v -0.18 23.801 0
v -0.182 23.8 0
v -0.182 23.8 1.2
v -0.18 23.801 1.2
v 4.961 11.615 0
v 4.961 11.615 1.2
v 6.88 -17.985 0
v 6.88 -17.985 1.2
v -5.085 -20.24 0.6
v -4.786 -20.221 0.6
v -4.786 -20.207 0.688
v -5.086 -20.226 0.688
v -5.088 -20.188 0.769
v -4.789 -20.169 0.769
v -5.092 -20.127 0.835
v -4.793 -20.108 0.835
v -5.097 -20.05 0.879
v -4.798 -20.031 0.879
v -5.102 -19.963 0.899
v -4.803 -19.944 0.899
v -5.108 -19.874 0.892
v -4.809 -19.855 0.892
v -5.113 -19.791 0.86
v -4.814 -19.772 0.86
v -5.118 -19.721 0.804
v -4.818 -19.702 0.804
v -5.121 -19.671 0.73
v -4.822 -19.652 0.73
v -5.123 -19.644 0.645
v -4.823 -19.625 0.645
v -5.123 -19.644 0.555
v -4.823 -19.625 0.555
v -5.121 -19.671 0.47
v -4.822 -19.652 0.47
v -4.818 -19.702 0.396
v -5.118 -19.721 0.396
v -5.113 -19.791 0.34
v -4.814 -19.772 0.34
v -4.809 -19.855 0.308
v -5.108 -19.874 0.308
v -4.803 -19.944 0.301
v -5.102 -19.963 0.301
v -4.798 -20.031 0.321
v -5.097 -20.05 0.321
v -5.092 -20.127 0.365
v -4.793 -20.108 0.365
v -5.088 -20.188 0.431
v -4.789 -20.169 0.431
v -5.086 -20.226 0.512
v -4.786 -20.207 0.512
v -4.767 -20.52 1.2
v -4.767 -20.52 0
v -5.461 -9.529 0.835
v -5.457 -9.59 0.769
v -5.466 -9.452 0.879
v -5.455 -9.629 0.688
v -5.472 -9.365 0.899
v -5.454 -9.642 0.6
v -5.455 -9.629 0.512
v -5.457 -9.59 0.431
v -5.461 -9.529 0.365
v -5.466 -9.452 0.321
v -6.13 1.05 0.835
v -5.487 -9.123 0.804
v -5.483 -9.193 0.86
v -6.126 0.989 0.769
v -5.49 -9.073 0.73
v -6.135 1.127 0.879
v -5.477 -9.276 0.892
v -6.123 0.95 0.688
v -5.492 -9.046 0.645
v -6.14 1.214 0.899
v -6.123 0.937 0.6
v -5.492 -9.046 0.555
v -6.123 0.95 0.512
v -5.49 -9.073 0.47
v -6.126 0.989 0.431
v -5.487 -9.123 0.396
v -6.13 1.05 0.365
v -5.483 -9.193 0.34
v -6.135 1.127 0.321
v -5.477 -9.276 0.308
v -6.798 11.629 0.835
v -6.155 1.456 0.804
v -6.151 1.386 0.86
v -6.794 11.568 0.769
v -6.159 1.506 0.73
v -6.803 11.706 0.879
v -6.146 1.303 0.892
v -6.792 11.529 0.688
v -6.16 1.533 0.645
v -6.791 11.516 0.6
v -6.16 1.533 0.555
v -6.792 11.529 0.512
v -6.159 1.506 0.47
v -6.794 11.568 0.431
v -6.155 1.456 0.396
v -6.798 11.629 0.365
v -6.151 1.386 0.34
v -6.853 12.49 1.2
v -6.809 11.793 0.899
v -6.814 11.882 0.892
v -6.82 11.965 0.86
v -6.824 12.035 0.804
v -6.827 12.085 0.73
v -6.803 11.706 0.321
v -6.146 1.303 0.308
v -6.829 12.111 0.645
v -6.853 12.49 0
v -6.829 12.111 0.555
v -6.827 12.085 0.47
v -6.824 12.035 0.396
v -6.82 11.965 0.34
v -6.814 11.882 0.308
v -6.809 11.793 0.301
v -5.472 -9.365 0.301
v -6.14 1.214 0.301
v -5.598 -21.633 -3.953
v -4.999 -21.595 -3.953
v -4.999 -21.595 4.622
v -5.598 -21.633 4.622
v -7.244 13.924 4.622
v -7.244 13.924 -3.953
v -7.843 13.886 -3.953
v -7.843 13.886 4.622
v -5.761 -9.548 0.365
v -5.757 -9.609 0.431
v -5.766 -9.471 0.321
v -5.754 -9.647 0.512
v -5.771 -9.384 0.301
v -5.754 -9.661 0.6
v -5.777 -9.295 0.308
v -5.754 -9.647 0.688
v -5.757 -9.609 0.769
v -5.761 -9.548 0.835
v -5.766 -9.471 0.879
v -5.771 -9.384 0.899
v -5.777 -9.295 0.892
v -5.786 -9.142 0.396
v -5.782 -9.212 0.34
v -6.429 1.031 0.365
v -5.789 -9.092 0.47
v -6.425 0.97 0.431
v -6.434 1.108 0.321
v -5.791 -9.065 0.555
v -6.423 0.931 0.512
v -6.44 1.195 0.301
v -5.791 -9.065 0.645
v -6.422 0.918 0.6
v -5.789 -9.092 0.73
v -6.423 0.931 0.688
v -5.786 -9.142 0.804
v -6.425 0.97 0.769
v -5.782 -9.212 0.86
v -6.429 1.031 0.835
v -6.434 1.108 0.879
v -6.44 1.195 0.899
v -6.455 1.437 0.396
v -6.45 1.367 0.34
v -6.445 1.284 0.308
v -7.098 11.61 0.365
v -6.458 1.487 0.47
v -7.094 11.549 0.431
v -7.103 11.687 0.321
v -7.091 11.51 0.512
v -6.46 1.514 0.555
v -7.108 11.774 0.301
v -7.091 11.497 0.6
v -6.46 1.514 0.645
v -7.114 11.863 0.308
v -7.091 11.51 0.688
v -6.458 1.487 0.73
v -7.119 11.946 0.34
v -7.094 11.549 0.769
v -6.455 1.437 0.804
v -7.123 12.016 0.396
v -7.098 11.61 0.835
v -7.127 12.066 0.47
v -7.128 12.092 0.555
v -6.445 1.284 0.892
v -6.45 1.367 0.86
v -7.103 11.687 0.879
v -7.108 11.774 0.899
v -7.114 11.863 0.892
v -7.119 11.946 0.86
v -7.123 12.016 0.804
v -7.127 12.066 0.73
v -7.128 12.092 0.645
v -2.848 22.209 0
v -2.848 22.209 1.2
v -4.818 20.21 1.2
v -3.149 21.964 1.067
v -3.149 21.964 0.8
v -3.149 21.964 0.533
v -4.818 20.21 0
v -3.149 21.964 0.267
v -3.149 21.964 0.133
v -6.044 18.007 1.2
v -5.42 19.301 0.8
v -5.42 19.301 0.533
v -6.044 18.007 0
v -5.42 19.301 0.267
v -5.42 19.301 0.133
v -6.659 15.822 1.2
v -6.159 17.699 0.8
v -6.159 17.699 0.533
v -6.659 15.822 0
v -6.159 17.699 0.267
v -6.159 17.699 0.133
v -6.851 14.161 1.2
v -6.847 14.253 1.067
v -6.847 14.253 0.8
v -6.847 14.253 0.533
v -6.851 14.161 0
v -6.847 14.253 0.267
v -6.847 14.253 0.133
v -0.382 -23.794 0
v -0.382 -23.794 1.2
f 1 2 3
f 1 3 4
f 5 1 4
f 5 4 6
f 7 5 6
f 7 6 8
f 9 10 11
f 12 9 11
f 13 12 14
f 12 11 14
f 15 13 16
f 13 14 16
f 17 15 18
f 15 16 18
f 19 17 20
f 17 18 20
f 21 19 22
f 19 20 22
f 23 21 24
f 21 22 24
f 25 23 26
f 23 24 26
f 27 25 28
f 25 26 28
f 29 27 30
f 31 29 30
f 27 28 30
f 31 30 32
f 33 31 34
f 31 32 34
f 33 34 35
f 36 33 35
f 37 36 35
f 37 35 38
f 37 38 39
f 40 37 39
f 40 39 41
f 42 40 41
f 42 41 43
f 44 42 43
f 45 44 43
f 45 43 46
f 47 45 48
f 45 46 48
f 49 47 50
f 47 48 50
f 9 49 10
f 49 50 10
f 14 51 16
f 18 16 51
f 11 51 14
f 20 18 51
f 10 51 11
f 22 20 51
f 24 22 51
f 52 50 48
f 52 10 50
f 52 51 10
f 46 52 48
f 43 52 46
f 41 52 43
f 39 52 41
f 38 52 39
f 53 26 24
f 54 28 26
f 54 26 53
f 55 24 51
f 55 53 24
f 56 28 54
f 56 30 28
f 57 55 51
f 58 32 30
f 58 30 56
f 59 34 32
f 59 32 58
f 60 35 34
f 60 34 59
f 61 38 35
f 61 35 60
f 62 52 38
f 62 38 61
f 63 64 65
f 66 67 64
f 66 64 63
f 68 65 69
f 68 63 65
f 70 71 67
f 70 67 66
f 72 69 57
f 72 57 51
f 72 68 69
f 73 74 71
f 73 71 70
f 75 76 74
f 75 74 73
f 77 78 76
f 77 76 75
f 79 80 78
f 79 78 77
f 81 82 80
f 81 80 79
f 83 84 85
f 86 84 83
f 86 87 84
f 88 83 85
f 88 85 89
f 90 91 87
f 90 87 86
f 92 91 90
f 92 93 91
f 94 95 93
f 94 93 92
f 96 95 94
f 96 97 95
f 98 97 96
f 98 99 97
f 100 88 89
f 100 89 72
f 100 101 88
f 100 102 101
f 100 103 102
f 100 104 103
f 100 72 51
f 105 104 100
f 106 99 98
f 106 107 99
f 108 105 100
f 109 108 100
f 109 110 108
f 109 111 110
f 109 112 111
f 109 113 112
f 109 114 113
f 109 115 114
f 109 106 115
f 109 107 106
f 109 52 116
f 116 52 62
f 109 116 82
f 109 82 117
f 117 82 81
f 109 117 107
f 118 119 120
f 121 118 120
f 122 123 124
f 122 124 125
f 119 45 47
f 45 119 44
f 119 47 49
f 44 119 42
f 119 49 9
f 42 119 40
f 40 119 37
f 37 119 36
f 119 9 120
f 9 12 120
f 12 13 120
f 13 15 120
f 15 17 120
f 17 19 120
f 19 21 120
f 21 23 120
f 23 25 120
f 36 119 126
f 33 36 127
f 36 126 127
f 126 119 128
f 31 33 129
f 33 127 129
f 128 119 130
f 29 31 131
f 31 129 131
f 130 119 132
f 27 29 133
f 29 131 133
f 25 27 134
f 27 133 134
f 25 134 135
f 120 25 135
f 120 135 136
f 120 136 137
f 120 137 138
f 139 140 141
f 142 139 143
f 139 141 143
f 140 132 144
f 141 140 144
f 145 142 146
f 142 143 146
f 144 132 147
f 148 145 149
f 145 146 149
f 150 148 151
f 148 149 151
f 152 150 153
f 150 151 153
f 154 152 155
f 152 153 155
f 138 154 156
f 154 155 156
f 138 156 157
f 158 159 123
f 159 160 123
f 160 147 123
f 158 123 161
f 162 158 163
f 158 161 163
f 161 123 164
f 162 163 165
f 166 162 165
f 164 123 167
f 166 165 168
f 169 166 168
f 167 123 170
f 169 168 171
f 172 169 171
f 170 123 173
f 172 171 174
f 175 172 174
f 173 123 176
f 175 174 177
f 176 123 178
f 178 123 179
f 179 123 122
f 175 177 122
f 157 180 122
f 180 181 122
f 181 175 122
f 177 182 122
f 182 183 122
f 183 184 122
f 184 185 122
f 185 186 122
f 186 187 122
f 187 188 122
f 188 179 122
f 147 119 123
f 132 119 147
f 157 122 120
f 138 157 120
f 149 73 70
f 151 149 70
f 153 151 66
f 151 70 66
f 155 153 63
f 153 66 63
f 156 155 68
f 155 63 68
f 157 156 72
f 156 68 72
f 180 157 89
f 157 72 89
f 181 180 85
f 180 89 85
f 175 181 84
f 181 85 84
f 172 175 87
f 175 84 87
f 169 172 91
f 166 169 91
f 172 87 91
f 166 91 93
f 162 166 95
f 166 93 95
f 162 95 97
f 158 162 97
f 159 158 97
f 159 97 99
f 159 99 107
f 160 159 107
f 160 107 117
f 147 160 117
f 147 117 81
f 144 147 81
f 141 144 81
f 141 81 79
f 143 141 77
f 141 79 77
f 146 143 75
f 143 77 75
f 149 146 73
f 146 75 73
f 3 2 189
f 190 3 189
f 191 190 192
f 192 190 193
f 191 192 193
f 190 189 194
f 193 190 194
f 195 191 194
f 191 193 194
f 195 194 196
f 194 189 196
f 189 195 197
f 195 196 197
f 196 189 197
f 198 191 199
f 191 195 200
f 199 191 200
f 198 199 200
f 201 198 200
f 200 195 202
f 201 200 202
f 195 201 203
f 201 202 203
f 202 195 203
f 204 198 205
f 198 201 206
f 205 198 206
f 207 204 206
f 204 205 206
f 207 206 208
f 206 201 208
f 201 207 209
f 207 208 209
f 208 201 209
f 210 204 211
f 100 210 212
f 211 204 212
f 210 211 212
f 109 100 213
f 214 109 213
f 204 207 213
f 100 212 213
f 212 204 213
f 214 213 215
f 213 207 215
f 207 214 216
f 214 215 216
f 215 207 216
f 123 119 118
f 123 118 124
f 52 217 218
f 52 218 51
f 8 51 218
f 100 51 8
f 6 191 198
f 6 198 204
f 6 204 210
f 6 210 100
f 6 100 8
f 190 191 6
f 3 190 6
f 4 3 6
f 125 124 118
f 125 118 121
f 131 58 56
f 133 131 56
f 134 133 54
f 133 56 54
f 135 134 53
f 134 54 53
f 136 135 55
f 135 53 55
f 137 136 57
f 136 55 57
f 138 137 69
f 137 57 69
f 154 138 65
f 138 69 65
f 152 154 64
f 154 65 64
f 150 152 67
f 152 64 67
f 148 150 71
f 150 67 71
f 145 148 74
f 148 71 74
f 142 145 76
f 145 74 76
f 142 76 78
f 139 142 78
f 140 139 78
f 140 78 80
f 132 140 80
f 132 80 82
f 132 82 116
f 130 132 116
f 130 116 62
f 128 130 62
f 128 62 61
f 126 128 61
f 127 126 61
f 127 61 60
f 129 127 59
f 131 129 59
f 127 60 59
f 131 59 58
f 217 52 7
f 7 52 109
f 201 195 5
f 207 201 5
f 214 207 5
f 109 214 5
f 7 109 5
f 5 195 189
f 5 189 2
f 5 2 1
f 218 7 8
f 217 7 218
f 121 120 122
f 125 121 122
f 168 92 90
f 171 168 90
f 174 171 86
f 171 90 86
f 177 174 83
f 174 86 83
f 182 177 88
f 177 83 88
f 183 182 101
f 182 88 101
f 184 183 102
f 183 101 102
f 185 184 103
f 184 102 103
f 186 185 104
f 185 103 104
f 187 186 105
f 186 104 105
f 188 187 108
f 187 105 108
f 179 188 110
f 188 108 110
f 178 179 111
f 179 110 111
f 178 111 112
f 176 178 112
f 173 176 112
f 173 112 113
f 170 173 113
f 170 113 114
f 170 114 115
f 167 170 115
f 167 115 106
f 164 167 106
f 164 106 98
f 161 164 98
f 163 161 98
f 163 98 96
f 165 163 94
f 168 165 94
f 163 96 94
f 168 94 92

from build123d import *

# Parameters (mm, degrees)
EXTRUDE_1_DEPTH     = 1.2
CUT_EXTRUDE_START   = -1.2
CUT_EXTRUDE_1_DEPTH = 1.2
SKETCH_4_R          = 0.3
EXTRUDE_2_DEPTH     = 0.3
SKETCH_5_W          = 8.574992792
SKETCH_5_H          = 35.59001433
EXTRUDE_3_DEPTH     = 0.6


# Read off the part's stored shape, not the designer's step: Вырез-Вытянуть-Тонкостенный1
with BuildPart() as part:
    # Эскиз1 → Бобышка-Вытянуть1 (new body)
    with BuildSketch(Plane.XY):
        with BuildLine():
            Line((-5.154205728, -20.72997941), (-0.373828409, -24.299606142))
            Line((-0.373828409, -24.299606142), (7.292363911, -18.166652286))
            Line((7.292363911, -18.166652286), (5.355661958, 11.708005491))
            Line((5.355661958, 11.708005491), (0.043580434, 24.299606142))
            Line((0.043580434, 24.299606142), (-0.335864947, 24.169962303))
            add(Edge.make_bspline(
                [(-0.335864947, 24.169962303), (-0.915680869, 23.882560356), (-2.036028517, 23.32722877), (-3.511970223, 22.237099766), (-4.75482851, 21.003209681), (-5.762815681, 19.609778776), (-6.510522146, 18.041460832), (-7.00511156, 16.321943976), (-7.292363911, 14.445670921), (-7.266146832, 13.148358332), (-7.252515423, 12.473828633)],
                knots=[0, 0, 0, 0, 0.133243547, 0.257459461, 0.376453369, 0.49320762, 0.610289886, 0.732843248, 0.86109349, 1, 1, 1, 1], degree=3))
            Line((-7.252515423, 12.473828633), (-5.154205728, -20.72997941))
        make_face()
    extrude(amount=EXTRUDE_1_DEPTH)

    # Вырез-Вытянуть-Тонкостенный1 outline → Вырез-Вытянуть-Тонкостенный1 (cut)
    with BuildSketch(Plane.XY.offset(1.2).offset(CUT_EXTRUDE_START)):
        with BuildLine():
            Line((0.043580434, 24.299606142), (-0.335864947, 24.169962303))
            add(Edge.make_bspline(
                [(-0.335864947, 24.169962303), (-0.915680869, 23.882560356), (-2.036028517, 23.32722877), (-3.511970223, 22.237099766), (-4.75482851, 21.003209681), (-5.762815681, 19.609778776), (-6.510522146, 18.041460832), (-7.00511156, 16.321943976), (-7.292363911, 14.445670921), (-7.266146832, 13.148358332), (-7.252515423, 12.473828633)],
                knots=[0, 0, 0, 0, 0.133243547, 0.257459461, 0.376453369, 0.49320762, 0.610289886, 0.732843248, 0.86109349, 1, 1, 1, 1], degree=3))
            Line((-7.252515423, 12.473828633), (-5.154205728, -20.72997941))
            Line((-5.154205728, -20.72997941), (-0.373828409, -24.299606142))
            Line((-0.373828409, -24.299606142), (7.292363911, -18.166652286))
            Line((7.292363911, -18.166652286), (5.355661958, 11.708005491))
            Line((5.355661958, 11.708005491), (0.043580434, 24.299606142))
        make_face()
        with BuildLine():
            add(Edge.make_bspline(
                [(-0.181718189, 23.79992617), (-0.707013415, 23.539538063), (-1.232077833, 23.278807084), (-2.230510803, 22.680549291), (-2.702172016, 22.340486172), (-3.596295179, 21.58727288), (-4.022133554, 21.170752521), (-4.785274575, 20.282262055), (-5.126061609, 19.808572418), (-5.567321736, 19.047557585), (-5.703329339, 18.784315196), (-5.950182465, 18.247397148), (-6.060575566, 17.974952319), (-6.35630443, 17.146776614), (-6.507229216, 16.580522405), (-6.739435456, 15.426716133), (-6.817026677, 14.83956809), (-6.876685102, 13.667024978), (-6.864657606, 13.078754602), (-6.852770472, 12.490490929)],
                knots=[0, 0, 0, 0, 0.125, 0.125, 0.25, 0.25, 0.375, 0.375, 0.5, 0.5, 0.5625, 0.5625, 0.625, 0.625, 0.75, 0.75, 0.875, 0.875, 1, 1, 1, 1], degree=3))
            Line((-0.181718189, 23.79992617), (-0.180003158, 23.800512138))
            Line((-0.180003158, 23.800512138), (4.960868317, 11.614742715))
            Line((4.960868317, 11.614742715), (6.879717061, -17.984519827))
            Line((6.879717061, -17.984519827), (-0.382255806, -23.794098121))
            Line((-0.382255806, -23.794098121), (-4.766668047, -20.520148369))
            Line((-4.766668047, -20.520148369), (-6.852770472, 12.490490929))
        make_face(mode=Mode.SUBTRACT)
    extrude(amount=CUT_EXTRUDE_1_DEPTH, mode=Mode.SUBTRACT)

    # Эскиз4 → Бобышка-Вытянуть2 (add)
    with BuildSketch(Plane(origin=(-6.03931721, -0.38165375, 0), x_dir=(0, 0, 1), z_dir=(-0.9980091663650418, -0.06306904035542692, 0))):
        with Locations(Location((0.6, -19.578666988, 0), (0, 0, 270))):
            Circle(SKETCH_4_R)
        with Locations(Location((0.6, -8.978666988, 0), (0, 0, 270))):
            Circle(SKETCH_4_R)
        with Locations(Location((0.6, 1.621333012, 0), (0, 0, 270))):
            Circle(SKETCH_4_R)
        with Locations(Location((0.6, 12.221333012, 0), (0, 0, 270))):
            Circle(SKETCH_4_R)
    extrude(amount=EXTRUDE_2_DEPTH)

    # Эскиз5 → Бобышка-Вытянуть3 (add)
    with BuildSketch(Plane(origin=(-6.33871996, -0.400574462, 0), x_dir=(0, 0, 1), z_dir=(-0.9980091663650418, -0.06306904035542692, 0))):
        with Locations((0.334402878, -3.441718967)):
            Rectangle(SKETCH_5_W, SKETCH_5_H)
    extrude(amount=EXTRUDE_3_DEPTH)


solid = part.part
